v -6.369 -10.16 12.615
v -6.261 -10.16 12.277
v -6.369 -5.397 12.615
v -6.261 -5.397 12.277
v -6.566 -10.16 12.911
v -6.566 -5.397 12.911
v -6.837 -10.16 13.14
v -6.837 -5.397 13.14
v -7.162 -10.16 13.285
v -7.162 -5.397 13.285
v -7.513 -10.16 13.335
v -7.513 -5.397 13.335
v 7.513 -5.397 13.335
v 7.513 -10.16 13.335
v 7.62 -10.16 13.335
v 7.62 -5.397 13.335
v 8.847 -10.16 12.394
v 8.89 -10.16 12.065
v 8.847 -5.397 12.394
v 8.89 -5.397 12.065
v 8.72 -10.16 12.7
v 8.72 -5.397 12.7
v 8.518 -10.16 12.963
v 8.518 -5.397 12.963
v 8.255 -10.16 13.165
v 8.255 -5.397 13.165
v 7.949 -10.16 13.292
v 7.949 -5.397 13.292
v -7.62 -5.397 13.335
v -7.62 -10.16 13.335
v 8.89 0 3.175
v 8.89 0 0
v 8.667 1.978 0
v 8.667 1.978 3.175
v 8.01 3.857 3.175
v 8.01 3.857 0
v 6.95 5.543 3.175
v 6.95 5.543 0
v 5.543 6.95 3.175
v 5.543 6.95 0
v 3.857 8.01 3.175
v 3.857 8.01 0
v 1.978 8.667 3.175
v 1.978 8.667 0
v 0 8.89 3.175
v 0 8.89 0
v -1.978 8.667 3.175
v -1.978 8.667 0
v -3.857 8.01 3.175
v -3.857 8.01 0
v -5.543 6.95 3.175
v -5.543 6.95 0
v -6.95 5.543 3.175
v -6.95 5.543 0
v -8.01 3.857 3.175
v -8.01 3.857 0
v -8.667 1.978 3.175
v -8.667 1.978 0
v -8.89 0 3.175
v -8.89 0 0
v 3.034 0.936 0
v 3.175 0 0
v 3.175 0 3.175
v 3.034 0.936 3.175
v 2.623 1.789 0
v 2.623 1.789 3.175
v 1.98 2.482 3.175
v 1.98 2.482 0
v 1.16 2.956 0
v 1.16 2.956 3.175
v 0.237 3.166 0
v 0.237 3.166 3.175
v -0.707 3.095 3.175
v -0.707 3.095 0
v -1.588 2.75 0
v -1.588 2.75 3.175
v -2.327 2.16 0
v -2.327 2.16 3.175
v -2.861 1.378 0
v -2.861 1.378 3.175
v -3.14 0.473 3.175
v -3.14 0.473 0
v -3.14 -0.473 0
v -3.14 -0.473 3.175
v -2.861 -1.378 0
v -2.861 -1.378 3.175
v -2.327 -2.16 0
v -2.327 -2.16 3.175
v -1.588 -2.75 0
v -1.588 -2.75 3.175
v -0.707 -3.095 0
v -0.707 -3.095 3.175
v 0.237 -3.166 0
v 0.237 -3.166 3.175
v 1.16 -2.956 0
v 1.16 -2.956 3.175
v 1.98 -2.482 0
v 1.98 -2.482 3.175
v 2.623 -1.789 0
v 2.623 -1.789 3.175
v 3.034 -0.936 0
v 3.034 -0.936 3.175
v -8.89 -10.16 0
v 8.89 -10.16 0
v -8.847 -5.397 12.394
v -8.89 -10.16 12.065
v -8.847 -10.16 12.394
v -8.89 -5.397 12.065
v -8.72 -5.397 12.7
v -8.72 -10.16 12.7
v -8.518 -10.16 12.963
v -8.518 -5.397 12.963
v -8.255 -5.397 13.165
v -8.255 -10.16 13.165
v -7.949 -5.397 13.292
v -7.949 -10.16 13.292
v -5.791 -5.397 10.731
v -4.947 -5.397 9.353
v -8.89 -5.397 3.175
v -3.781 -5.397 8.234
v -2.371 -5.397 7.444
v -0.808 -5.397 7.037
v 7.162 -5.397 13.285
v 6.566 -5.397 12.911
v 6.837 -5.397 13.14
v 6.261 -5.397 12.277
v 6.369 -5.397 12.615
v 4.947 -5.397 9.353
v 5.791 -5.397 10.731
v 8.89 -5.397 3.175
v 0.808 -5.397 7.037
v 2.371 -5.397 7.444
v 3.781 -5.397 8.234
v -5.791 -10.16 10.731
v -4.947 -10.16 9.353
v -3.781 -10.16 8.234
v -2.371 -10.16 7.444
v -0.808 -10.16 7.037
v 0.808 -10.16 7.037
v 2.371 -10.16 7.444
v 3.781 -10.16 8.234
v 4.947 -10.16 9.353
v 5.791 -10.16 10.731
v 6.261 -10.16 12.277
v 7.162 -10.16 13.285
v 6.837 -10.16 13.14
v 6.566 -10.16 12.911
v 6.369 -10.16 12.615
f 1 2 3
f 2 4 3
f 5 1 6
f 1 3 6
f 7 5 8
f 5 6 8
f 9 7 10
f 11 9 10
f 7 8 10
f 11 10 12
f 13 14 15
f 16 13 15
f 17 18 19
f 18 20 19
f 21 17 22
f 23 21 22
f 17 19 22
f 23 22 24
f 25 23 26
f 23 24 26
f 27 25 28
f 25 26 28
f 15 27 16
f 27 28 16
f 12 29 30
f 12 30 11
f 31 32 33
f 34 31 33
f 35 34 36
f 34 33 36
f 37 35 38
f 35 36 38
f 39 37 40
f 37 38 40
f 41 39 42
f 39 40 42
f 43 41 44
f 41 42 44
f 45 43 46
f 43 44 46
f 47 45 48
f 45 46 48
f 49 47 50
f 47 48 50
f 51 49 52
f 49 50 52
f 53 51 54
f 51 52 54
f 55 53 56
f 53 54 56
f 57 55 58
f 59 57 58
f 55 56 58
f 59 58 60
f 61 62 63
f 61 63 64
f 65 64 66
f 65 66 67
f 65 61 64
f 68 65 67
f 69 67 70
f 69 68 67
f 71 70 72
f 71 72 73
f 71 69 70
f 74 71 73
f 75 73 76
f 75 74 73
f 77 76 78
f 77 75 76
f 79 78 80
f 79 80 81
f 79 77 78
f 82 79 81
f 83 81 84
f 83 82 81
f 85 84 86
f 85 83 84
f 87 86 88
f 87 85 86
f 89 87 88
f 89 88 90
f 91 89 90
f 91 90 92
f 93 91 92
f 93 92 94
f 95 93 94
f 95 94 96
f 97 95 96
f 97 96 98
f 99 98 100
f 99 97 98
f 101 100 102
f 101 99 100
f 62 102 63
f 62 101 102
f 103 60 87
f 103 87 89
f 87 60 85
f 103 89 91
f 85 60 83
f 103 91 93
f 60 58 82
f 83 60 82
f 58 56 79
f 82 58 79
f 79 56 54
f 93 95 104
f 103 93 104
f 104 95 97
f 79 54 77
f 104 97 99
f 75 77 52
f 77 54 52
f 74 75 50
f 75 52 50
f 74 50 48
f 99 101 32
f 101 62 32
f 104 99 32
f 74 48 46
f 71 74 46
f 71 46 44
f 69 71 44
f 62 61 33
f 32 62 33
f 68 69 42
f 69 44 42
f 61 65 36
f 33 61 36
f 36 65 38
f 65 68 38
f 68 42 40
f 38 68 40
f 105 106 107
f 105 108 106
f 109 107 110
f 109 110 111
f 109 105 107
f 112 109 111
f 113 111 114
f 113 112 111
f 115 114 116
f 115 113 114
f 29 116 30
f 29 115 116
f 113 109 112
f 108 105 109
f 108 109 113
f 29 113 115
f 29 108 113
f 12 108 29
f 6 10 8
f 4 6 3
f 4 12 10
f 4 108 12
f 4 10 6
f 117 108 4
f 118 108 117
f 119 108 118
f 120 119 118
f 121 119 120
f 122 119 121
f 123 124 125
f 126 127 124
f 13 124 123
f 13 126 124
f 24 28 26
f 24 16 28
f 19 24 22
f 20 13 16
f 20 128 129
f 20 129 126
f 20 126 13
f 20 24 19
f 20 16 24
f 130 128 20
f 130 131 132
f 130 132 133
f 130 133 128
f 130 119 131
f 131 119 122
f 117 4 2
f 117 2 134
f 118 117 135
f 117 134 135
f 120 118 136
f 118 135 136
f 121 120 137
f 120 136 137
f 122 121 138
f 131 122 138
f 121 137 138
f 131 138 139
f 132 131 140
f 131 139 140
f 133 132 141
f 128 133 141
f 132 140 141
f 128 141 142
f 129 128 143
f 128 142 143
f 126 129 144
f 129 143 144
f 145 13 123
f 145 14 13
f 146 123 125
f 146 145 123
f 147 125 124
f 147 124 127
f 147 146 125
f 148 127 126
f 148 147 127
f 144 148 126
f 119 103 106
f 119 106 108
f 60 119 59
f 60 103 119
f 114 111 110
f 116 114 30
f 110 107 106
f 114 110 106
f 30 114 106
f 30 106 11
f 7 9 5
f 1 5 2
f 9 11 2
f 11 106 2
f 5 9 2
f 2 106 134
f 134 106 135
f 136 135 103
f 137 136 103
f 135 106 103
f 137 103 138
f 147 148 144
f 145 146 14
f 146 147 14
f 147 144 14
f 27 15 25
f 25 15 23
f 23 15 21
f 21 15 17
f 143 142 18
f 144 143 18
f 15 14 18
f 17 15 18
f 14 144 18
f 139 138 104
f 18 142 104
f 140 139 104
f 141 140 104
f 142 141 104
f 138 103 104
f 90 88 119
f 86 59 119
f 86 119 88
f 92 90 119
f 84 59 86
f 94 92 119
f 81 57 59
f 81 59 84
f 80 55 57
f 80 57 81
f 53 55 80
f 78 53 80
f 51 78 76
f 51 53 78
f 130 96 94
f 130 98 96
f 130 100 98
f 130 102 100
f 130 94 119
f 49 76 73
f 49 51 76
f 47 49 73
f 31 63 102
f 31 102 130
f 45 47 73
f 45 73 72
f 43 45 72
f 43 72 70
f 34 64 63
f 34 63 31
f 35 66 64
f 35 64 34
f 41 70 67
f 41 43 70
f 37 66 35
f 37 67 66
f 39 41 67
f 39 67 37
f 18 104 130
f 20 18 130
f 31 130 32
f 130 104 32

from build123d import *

# Parameters (mm, degrees)
SKETCH1_R           = 3.175
BOSS_EXTRUDE1_DEPTH = 3.175
SKETCH2_W           = 17.78
SKETCH2_H           = 4.7625
BOSS_EXTRUDE2_DEPTH = 10.16
SKETCH3_R           = 6.35
CUT_EXTRUDE1_DEPTH  = 17.78
FILLET2_R           = 1.27
FILLET3_R           = 1.27


with BuildPart() as part:
    # Sketch1 → Boss-Extrude1 (new body)
    with BuildSketch(Plane.XY):
        with BuildLine():
            Line((-8.89, 0), (-8.89, -10.16))
            Line((-8.89, -10.16), (8.89, -10.16))
            Line((8.89, -10.16), (8.89, 0))
            ThreePointArc((8.89, 0), (0, 8.89), (-8.89, 0))
        make_face()
        Circle(SKETCH1_R, mode=Mode.SUBTRACT)
    extrude(amount=BOSS_EXTRUDE1_DEPTH)

    # Sketch2 → Boss-Extrude2 (add)
    with BuildSketch(Plane.XY.offset(3.175)):
        with Locations((0, -7.77875)):
            Rectangle(SKETCH2_W, SKETCH2_H)
    extrude(amount=BOSS_EXTRUDE2_DEPTH)

    # Sketch3 → Cut-Extrude1 (cut)
    with BuildSketch(Plane(origin=(0, -10.16, 0), x_dir=(-1, 0, 0), z_dir=(0, -1, 0))):
        with Locations((0, -13.335)):
            Circle(SKETCH3_R)
    extrude(amount=-CUT_EXTRUDE1_DEPTH, mode=Mode.SUBTRACT)

    # Fillet2
    fillet2_edges = [part.edges().sort_by_distance(p)[0] for p in [
        (-8.89, -7.77875, 13.335),
        (8.89, -7.77875, 13.335),
    ]]
    fillet(fillet2_edges, radius=FILLET2_R)

    # Fillet3
    fillet3_edges = [part.edges().sort_by_distance(p)[0] for p in [
        (-6.35, -7.77875, 13.335),
        (6.35, -7.77875, 13.335),
    ]]
    fillet(fillet3_edges, radius=FILLET3_R)


solid = part.part
